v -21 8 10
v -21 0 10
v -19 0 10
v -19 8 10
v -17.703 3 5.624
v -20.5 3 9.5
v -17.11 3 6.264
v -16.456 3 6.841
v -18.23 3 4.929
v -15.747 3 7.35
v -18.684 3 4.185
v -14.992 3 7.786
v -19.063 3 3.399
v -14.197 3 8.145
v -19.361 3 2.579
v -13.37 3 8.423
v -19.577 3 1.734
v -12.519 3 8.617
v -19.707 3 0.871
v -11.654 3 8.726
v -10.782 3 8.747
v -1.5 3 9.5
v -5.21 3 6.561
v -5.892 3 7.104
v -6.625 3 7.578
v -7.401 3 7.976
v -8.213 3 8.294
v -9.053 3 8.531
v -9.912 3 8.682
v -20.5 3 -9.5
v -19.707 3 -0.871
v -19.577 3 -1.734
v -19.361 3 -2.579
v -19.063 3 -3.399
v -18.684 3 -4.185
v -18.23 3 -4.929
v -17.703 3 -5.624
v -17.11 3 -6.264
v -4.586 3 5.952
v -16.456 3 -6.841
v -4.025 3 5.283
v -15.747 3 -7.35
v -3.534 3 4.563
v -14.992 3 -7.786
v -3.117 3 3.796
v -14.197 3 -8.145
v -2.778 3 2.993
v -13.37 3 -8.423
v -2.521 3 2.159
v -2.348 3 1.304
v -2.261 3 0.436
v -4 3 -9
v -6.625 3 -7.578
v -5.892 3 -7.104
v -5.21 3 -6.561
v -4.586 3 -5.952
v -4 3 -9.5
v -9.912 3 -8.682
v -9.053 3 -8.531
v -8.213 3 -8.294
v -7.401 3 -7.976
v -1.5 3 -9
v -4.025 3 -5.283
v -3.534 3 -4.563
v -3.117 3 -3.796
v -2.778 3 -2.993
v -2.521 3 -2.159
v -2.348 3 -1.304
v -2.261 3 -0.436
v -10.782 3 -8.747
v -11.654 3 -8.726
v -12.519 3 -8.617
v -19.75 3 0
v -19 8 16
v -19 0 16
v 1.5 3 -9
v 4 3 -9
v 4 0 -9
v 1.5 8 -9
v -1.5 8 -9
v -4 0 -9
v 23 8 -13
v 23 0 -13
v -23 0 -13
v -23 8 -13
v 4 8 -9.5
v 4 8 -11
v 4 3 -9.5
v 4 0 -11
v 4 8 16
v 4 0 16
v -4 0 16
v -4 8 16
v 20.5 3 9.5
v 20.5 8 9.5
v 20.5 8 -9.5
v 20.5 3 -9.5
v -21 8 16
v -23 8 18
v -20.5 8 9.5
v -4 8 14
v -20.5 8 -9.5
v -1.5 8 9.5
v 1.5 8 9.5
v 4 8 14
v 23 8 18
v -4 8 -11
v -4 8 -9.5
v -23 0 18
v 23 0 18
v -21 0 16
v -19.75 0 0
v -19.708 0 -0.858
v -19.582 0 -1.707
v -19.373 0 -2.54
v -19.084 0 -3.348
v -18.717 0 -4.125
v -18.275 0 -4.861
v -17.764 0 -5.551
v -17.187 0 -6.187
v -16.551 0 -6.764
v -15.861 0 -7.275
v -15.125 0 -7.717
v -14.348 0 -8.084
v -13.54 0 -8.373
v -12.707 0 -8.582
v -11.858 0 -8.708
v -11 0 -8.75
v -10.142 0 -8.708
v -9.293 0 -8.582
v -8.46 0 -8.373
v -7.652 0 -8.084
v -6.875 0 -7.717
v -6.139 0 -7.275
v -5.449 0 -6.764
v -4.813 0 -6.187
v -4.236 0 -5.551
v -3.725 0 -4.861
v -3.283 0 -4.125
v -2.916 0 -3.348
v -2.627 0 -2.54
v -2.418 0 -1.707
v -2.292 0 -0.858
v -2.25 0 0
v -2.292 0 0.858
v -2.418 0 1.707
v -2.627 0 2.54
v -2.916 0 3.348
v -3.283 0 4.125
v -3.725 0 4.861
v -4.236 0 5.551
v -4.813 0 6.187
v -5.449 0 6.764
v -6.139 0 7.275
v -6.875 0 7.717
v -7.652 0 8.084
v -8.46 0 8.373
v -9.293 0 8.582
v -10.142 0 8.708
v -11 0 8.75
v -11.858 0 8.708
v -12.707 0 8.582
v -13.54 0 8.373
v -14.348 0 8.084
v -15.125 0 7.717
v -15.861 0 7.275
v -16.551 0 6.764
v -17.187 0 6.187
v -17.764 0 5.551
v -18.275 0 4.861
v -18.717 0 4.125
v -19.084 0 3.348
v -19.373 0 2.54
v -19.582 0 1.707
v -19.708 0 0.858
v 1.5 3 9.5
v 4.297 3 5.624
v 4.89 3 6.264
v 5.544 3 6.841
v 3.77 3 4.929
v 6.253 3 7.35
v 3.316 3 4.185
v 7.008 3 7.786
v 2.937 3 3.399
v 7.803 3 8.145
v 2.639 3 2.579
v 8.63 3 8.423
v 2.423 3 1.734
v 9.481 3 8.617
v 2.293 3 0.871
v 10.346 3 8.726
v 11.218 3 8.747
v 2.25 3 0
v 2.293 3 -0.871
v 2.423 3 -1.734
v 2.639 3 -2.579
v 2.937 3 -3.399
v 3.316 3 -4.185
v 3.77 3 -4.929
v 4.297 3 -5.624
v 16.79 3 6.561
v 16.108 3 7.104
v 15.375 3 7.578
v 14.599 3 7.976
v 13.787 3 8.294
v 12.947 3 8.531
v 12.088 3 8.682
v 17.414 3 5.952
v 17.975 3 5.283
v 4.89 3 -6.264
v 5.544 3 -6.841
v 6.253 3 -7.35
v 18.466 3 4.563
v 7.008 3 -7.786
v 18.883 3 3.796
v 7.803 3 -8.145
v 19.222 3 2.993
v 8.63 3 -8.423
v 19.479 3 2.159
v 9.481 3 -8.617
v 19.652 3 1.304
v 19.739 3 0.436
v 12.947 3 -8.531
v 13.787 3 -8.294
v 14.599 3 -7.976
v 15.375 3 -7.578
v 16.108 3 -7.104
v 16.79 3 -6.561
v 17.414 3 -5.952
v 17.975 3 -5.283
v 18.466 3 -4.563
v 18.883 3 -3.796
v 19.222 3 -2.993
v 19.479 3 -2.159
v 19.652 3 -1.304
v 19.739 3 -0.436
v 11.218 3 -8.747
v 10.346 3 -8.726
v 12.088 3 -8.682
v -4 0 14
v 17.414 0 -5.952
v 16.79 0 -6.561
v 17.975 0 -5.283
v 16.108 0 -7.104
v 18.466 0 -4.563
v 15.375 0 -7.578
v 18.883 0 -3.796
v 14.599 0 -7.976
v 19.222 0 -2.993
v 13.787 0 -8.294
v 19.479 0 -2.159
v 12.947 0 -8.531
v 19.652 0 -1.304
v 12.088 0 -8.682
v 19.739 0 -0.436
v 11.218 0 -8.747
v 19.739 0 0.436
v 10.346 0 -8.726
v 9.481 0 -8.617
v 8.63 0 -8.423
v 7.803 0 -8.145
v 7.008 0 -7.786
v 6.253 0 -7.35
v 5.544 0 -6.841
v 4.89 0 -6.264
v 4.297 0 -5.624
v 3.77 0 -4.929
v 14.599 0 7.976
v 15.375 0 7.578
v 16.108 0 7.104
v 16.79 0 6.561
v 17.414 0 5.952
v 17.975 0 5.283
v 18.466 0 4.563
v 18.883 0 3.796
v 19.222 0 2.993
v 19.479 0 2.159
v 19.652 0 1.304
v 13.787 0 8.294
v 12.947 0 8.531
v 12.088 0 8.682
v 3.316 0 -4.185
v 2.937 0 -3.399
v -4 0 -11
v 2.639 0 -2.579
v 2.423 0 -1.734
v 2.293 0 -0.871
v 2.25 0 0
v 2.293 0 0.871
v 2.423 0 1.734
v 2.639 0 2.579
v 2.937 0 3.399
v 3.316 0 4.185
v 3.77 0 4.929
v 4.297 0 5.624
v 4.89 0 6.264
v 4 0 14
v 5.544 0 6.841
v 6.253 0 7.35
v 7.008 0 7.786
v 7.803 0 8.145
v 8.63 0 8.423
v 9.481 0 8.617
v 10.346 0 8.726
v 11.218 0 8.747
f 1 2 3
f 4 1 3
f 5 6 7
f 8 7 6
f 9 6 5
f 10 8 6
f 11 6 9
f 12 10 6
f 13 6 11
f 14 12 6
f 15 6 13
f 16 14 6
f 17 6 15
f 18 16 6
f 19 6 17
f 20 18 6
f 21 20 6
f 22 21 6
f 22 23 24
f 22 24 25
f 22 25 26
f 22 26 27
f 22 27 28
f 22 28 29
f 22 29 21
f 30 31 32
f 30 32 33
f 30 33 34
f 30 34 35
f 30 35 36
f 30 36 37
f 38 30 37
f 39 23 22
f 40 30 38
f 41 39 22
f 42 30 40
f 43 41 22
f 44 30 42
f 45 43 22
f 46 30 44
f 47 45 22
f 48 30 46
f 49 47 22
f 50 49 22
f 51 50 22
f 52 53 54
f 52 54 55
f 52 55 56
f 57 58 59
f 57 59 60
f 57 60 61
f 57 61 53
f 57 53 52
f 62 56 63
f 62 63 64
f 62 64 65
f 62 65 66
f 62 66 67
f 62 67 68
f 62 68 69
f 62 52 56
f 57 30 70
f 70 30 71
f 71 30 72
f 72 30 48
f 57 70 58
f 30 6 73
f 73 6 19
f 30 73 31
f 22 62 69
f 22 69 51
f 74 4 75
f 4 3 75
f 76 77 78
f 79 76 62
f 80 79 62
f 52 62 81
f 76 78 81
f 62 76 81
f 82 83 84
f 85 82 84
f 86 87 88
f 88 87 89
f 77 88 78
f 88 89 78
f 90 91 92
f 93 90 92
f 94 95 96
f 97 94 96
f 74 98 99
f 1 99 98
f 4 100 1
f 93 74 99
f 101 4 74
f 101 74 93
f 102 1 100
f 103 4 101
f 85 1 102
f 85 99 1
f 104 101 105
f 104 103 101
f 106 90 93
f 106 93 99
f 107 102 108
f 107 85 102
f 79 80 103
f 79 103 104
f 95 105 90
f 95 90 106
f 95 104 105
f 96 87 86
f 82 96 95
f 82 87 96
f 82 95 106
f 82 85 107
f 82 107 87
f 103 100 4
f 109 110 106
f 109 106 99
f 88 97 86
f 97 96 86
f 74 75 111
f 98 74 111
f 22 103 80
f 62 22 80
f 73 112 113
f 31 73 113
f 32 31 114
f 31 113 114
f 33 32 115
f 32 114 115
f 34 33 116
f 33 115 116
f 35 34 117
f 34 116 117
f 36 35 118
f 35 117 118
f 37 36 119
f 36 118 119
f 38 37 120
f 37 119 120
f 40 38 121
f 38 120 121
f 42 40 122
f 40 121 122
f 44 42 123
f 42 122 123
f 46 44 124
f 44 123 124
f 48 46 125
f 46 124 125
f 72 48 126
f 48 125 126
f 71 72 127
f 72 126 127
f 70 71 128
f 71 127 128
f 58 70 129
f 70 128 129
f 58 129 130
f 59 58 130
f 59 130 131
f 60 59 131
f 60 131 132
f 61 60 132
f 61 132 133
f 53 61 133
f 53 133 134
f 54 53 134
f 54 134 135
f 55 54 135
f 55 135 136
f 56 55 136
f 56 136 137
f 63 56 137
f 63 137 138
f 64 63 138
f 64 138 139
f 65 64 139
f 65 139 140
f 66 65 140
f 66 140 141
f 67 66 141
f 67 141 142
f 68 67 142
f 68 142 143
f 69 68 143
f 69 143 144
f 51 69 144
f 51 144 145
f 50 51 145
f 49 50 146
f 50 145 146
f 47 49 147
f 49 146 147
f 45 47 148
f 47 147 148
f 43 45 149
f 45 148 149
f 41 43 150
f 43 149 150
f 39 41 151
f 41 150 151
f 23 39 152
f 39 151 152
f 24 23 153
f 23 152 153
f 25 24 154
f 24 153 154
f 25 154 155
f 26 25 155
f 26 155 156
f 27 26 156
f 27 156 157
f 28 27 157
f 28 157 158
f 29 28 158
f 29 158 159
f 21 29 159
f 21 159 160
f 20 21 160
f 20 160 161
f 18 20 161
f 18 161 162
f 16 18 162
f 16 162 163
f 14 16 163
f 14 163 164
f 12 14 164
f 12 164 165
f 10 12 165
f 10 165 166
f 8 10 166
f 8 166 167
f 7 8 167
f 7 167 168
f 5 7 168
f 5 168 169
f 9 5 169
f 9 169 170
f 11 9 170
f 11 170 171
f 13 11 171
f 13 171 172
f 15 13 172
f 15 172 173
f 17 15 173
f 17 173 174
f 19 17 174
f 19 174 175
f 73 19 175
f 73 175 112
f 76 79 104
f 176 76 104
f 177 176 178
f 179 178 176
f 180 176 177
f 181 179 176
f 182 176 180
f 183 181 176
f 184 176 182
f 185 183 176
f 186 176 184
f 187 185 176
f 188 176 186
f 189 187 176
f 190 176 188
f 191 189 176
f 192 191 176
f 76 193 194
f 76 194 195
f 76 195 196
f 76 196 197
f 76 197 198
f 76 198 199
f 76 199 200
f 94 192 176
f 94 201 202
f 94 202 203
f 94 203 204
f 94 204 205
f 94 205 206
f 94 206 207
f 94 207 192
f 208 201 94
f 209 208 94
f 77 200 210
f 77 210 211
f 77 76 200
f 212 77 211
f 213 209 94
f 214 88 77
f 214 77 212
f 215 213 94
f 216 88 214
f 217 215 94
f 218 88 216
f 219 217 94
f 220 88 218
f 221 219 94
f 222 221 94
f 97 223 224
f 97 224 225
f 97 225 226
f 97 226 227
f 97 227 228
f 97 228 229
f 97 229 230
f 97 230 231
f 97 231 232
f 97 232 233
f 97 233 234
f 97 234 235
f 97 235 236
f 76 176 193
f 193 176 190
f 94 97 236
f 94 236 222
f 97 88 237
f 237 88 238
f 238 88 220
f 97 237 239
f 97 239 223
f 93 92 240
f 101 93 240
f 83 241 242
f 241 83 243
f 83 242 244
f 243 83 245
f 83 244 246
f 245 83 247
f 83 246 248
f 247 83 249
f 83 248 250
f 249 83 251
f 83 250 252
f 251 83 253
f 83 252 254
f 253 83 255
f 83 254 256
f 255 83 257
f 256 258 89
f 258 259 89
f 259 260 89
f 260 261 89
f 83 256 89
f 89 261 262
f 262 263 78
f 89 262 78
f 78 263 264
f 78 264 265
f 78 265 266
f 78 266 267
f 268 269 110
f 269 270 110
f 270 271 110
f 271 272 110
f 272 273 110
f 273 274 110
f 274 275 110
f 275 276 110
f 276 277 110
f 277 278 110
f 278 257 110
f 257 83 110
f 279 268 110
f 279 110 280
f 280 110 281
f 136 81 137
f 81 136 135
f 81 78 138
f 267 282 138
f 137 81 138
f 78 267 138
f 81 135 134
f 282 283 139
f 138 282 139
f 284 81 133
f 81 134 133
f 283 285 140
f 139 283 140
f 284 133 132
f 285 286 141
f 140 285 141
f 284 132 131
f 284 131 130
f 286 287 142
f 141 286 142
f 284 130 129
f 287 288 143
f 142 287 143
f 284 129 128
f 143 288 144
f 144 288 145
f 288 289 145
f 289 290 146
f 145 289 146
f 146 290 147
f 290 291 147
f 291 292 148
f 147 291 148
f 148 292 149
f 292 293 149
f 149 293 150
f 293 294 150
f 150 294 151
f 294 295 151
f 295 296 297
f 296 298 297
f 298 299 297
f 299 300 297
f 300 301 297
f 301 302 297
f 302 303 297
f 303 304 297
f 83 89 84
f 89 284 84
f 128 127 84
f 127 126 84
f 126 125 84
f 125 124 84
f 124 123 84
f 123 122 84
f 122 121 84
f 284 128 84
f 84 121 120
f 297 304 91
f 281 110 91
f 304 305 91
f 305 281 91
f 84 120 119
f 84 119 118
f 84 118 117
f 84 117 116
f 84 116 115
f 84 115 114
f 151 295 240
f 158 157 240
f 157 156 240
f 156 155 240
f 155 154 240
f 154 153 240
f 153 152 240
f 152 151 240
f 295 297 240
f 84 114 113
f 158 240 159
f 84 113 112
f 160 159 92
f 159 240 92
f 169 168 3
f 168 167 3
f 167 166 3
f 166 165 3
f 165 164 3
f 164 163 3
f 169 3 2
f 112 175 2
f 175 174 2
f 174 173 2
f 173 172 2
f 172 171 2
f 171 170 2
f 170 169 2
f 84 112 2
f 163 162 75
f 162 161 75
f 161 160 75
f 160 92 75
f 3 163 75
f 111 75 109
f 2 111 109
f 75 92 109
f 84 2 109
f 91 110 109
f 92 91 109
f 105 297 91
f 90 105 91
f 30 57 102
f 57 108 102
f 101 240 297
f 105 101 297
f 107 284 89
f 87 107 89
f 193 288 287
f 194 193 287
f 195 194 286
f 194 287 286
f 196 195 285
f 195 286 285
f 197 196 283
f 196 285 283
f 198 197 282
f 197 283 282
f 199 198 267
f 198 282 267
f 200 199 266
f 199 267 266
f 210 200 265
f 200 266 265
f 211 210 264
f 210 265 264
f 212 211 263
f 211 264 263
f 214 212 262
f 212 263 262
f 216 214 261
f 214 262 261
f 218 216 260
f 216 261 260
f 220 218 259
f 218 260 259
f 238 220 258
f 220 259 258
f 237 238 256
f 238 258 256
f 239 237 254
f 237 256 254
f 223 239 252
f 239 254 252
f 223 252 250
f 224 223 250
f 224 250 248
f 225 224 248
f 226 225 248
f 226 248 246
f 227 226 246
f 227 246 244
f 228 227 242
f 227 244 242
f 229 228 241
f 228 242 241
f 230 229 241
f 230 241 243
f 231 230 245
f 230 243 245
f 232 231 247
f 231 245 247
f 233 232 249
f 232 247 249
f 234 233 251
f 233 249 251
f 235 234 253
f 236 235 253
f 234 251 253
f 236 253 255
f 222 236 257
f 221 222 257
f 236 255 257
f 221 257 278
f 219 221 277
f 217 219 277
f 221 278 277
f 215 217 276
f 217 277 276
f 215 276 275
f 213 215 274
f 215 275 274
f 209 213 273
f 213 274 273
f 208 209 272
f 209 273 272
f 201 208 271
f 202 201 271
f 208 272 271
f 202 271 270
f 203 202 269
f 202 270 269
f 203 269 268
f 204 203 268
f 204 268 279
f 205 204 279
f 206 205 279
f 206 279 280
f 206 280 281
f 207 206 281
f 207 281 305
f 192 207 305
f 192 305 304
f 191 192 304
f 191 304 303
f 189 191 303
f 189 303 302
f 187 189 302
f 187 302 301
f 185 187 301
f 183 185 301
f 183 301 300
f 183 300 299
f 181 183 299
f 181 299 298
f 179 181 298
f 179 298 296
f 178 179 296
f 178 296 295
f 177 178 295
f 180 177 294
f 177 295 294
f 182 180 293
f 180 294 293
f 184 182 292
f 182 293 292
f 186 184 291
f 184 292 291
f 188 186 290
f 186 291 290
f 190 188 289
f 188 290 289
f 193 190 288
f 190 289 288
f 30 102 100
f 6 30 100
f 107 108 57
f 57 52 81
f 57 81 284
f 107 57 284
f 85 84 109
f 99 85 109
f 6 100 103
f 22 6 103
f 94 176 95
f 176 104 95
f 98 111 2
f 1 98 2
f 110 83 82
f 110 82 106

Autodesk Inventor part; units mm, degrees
ref_plane "YZ Plane" through (0, 0, 0) normal (1, 0, 0) x (0, 1, 0)
ref_plane "XZ Plane" through (0, 0, 0) normal (0, 1, 0) x (-1, 0, 0)
ref_plane "XY Plane" through (0, 0, 0) normal (0, 0, 1) x (1, 0, 0)
sketch "Sketch1" plane through (0, 0, 0) normal (0, 1, 0) x (-1, 0, 0)
  line L0 (-23, 13) -> (23, 13)
  line L1 (23, 13) -> (23, -13)
  line L2 (23, -13) -> (-23, -13)
  line L3 (-23, -13) -> (-23, 13)
  line L4 (-23, 13) -> (23, -13) construction
  line L5 (23, 13) -> (-23, -13) construction
  line L6 (0, 0) -> (-11, 0)
  circle A0 centre (-11, 0) radius 8.75
  line L7 (0, 0) -> (11, 0)
  circle A1 centre (11, 0) radius 8.75
  dimension "d0" = 46
  dimension "d1" = 26
  dimension "d2" = 11
  dimension "d3" = 17.5
  dimension "d4" = 11
  dimension "d5" = 17.5
extrude "Extrusion1" add sketch "Sketch1" along normal blind 5
sketch "Sketch3" plane through (-23, 0, 13) normal (0, 0, 1) x (1, 0, 0)
  line L0 (46, 0) -> (0, 0) projected
  line L1 (46, 0) -> (46, 5) projected
  line L2 (0, 5) -> (46, 5) projected
  line L3 (0, 0) -> (0, 5) projected
  point P0 (23, 0)
extrude "Extrusion2" add sketch "Sketch3" along normal blind 5
sketch "Sketch2" plane through (0, 5, 0) normal (0, 1, 0) x (1, 0, 0)
  circle A0 centre (-11, 0) radius 8.75 projected
  circle A1 centre (11, 0) radius 8.75 projected
  line L0 (23, 13) -> (23, -18) projected
  line L1 (23, 13) -> (-23, 13) projected
  line L2 (-23, 13) -> (-23, -18) projected
  line L3 (23, 13) -> (-23, 13) projected
  line L4 (0, 13) -> (0, 10)
  line L5 (-4, 9) -> (4, 9)
  line L6 (4, 9) -> (4, 11)
  line L7 (4, 11) -> (-4, 11)
  line L8 (-4, 11) -> (-4, 9)
  line L9 (-4, 9) -> (4, 11) construction
  line L10 (4, 9) -> (-4, 11) construction
  line L11 (23, -18) -> (-23, -18) projected
  line L12 (23, -18) -> (-23, -18) projected
  line L13 (0, -18) -> (0, -15)
  line L14 (-4, -16) -> (4, -16)
  line L15 (4, -16) -> (4, -14)
  line L16 (4, -14) -> (-4, -14)
  line L17 (-4, -14) -> (-4, -16)
  line L18 (-4, -16) -> (4, -14) construction
  line L19 (4, -16) -> (-4, -14) construction
  line L20 (-23, 13) -> (-23, -18) projected
  line L21 (-23, -18) -> (-23, -13)
  line L22 (-23, -13) -> (-20, -13)
  line L23 (-21, -16) -> (-19, -16)
  line L24 (-19, -16) -> (-19, -10)
  line L25 (-19, -10) -> (-21, -10)
  line L26 (-21, -10) -> (-21, -16)
  line L27 (-21, -16) -> (-19, -10) construction
  line L28 (-19, -16) -> (-21, -10) construction
  point P0 (0, 0)
  dimension "d8" = 3
  dimension "d9" = 8
  dimension "d10" = 2
  dimension "d16" = 3
  dimension "d17" = 8
  dimension "d18" = 2
  dimension "d19" = 5
  dimension "d20" = 3
  dimension "d21" = 2
  dimension "d22" = 6
extrude "Extrusion3" cut sketch "Sketch2" against normal blind 5 contours L7 L6 L5 L8 | L26 L25 L24 L23 | L14 L17 L16 L15
sketch "Sketch4" plane through (0, 5, 0) normal (0, 1, 0) x (1, 0, 0)
  line L0 (4, 11) -> (4, 9) projected
  line L1 (4, 9) -> (-4, 9) projected
  line L2 (-4, 9) -> (-4, 11) projected
  line L3 (-4, 11) -> (4, 11) projected
  line L4 (-19, -10) -> (-19, -16) projected
  line L5 (-19, -16) -> (-21, -16) projected
  line L6 (-21, -16) -> (-21, -10) projected
  line L7 (-21, -10) -> (-19, -10) projected
  line L8 (4, -14) -> (4, -16) projected
  line L9 (4, -16) -> (-4, -16) projected
  line L10 (-4, -16) -> (-4, -14) projected
  line L11 (-4, -14) -> (4, -14) projected
  circle A0 centre (-11, 0) radius 8.75 projected
  circle A1 centre (11, 0) radius 8.75 projected
  line L12 (23, 13) -> (23, -18) projected
  line L13 (23, 13) -> (-23, 13) projected
  line L14 (-23, 13) -> (-23, -18) projected
  line L15 (23, -18) -> (-23, -18) projected
  point P0 (0, 0)
extrude "Extrusion4" add sketch "Sketch4" along normal blind 3
sketch "Sketch5" plane through (0, 8, 0) normal (0, 1, 0) x (1, 0, 0)
  circle A0 centre (11, 0) radius 8.75 projected
  circle A1 centre (-11, 0) radius 8.75 projected
  line L0 (4, -16) -> (-4, -16) projected
  line L1 (-4, -16) -> (-4, -14) projected
  line L2 (-4, -14) -> (4, -14) projected
  line L3 (4, -14) -> (4, -16) projected
  line L4 (4, 9) -> (-4, 9) projected
  line L5 (-4, 9) -> (-4, 11) projected
  line L6 (-4, 11) -> (4, 11) projected
  line L7 (4, 11) -> (4, 9) projected
  line L8 (-19, -16) -> (-21, -16) projected
  line L9 (-21, -16) -> (-21, -10) projected
  line L10 (-21, -10) -> (-19, -10) projected
  line L11 (-19, -10) -> (-19, -16) projected
  line L12 (23, -18) -> (23, 13) projected
  line L13 (23, 13) -> (-23, 13) projected
  line L14 (-23, 13) -> (-23, -18) projected
  line L15 (-23, -18) -> (23, -18) projected
  line L16 (-20.5, -9.5) -> (-1.5, -9.5)
  line L17 (-1.5, -9.5) -> (-1.5, 9.5)
  line L18 (-1.5, 9.5) -> (-20.5, 9.5)
  line L19 (-20.5, 9.5) -> (-20.5, -9.5)
  line L20 (-20.5, -9.5) -> (-1.5, 9.5) construction
  line L21 (-1.5, -9.5) -> (-20.5, 9.5) construction
  line L22 (1.5, -9.5) -> (20.5, -9.5)
  line L23 (20.5, -9.5) -> (20.5, 9.5)
  line L24 (20.5, 9.5) -> (1.5, 9.5)
  line L25 (1.5, 9.5) -> (1.5, -9.5)
  line L26 (1.5, -9.5) -> (20.5, 9.5) construction
  line L27 (20.5, -9.5) -> (1.5, 9.5) construction
  point P0 (0, 0)
  dimension "d27" = 19
  dimension "d28" = 19
  dimension "d29" = 19
  dimension "d30" = 19
extrude "Extrusion5" cut sketch "Sketch5" against normal blind 5 contours A0 | A1 | L7 L24 L23 L22 L25 L4 | L4 L25 L24 L7 | L17 L16 L19 L18 L5 L4 | L4 L5 L18 L17
properties part number "buttons"
